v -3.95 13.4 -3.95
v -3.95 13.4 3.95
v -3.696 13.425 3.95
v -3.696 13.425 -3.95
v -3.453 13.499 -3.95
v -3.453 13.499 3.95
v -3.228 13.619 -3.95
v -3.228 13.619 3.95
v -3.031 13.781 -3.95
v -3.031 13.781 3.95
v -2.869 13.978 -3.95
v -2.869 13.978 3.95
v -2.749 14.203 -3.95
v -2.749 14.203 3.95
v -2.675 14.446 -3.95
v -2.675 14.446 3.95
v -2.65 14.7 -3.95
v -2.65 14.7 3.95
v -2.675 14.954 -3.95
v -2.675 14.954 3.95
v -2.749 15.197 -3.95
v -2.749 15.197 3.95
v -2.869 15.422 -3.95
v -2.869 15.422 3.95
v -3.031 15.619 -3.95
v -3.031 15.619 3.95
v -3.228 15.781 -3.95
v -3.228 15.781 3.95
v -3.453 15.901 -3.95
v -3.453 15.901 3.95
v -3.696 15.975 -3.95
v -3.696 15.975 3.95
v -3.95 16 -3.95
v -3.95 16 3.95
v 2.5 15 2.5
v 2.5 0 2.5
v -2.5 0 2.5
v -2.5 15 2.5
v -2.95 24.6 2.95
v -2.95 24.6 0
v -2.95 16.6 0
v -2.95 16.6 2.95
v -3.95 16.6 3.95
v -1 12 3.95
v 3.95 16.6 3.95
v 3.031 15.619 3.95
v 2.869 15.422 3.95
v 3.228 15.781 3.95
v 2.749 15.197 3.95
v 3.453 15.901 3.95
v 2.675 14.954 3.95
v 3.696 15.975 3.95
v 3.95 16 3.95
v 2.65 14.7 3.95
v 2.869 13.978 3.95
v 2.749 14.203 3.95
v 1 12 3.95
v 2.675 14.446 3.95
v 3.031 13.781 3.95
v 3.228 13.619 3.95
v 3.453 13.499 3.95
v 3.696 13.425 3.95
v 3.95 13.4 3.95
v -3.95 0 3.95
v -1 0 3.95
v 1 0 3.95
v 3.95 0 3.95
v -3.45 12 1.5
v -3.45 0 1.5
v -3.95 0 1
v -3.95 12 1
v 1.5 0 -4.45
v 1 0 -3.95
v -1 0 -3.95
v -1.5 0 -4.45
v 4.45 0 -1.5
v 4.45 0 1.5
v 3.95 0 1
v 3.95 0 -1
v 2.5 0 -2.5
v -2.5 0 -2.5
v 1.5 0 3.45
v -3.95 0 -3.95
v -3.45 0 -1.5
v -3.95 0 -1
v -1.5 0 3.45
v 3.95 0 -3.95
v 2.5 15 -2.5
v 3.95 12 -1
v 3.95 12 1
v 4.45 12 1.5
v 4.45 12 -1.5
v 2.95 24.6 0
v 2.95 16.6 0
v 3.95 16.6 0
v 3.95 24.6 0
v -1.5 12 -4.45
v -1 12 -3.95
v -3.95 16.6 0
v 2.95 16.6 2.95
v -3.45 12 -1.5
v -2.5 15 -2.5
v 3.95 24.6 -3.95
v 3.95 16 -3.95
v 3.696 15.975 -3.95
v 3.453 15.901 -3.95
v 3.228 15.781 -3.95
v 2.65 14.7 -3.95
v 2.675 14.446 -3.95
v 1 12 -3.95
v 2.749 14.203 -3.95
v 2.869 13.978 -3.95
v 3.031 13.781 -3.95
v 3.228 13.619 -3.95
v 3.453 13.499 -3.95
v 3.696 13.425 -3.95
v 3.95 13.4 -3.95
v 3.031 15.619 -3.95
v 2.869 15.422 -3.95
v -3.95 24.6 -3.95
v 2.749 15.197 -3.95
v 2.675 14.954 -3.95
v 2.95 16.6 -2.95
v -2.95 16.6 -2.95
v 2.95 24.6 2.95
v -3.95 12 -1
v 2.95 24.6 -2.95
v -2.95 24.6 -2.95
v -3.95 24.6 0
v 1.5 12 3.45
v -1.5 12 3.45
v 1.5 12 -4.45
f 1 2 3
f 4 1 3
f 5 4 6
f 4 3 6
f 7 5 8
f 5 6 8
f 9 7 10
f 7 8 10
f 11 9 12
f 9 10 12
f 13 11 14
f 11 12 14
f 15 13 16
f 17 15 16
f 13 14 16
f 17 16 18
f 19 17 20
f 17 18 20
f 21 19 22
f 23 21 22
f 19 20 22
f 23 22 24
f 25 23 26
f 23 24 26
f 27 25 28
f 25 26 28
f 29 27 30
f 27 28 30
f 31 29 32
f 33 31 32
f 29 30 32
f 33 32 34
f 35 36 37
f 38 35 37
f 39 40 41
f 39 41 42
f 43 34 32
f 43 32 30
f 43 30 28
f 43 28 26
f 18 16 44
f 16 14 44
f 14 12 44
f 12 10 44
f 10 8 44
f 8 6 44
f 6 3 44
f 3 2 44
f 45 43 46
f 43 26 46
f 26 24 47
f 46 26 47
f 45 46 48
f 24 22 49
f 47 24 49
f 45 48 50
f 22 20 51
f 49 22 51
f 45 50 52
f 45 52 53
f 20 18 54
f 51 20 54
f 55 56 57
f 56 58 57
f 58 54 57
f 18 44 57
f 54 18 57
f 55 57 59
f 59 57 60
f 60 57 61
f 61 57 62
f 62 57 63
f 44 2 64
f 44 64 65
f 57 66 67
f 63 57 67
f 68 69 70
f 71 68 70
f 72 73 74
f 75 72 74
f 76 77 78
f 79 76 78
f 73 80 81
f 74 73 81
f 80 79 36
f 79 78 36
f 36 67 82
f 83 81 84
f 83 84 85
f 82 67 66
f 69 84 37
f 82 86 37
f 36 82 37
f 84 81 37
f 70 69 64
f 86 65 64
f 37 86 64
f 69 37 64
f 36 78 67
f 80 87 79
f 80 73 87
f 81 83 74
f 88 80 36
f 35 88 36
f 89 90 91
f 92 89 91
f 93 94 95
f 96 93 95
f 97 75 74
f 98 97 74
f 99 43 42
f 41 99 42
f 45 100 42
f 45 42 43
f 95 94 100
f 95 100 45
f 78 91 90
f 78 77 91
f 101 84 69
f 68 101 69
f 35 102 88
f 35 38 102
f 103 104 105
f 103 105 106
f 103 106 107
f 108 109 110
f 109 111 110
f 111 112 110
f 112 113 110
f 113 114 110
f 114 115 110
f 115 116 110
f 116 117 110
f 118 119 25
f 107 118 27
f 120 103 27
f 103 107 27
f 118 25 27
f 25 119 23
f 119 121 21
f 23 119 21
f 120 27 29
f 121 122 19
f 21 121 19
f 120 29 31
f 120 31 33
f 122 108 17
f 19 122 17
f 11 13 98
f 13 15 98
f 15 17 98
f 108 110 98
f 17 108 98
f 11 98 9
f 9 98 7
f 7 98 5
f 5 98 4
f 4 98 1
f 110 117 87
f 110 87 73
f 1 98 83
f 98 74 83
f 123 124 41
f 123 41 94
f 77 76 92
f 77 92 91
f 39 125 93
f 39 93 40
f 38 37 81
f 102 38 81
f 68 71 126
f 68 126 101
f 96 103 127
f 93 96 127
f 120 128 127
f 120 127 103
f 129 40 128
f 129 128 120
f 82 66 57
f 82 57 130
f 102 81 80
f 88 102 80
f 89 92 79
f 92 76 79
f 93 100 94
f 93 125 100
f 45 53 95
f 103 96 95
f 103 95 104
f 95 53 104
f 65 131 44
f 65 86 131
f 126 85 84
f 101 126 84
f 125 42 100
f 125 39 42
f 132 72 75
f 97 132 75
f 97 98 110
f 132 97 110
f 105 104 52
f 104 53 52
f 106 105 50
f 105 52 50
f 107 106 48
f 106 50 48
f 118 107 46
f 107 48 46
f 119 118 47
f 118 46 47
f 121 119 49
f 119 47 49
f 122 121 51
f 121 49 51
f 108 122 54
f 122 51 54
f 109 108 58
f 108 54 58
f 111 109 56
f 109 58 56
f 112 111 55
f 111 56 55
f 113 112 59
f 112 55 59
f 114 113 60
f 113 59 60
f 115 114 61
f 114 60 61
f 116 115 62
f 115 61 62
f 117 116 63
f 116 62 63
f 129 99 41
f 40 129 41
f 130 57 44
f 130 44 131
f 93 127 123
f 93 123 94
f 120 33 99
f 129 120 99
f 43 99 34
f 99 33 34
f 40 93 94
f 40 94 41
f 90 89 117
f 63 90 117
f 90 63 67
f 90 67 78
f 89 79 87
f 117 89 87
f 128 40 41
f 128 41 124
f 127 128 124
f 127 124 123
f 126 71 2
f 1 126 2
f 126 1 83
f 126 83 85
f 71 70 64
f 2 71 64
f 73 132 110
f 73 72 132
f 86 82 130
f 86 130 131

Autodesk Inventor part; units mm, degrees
ref_plane "YZ Plane" through (0, 0, 0) normal (1, 0, 0) x (0, 1, 0)
ref_plane "XZ Plane" through (0, 0, 0) normal (0, 1, 0) x (-1, 0, 0)
ref_plane "XY Plane" through (0, 0, 0) normal (0, 0, 1) x (1, 0, 0)
sketch "Sketch1" plane through (0, 0, 0) normal (0, 1, 0) x (-1, 0, 0)
  line L0 (-3.95, -3.95) -> (3.95, -3.95)
  line L1 (3.95, -3.95) -> (3.95, 3.95)
  line L2 (3.95, 3.95) -> (-3.95, 3.95)
  line L3 (-3.95, 3.95) -> (-3.95, -3.95)
  line L4 (-3.95, -3.95) -> (3.95, 3.95) construction
  line L5 (3.95, -3.95) -> (-3.95, 3.95) construction
  point P0 (0, 0)
  dimension "d0" = 7.9
  dimension "d1" = 7.9
extrude "Extrusion1" add sketch "Sketch1" along normal blind 24.6
sketch "Sketch2" plane through (-3.95, 0, 3.95) normal (0, 0, 1) x (1, 0, 0)
  line L0 (7.9, 0) -> (7.9, 24.6) projected
  line L1 (0, 24.6) -> (7.9, 24.6) projected
  line L2 (0, 0) -> (0, 24.6) projected
  circle A0 centre (0, 14.7) radius 1.3
  circle A1 centre (7.9, 14.7) radius 1.3
  point P0 (3.95, 0)
  dimension "d4" = 2.6
  dimension "d5" = 2.6
  dimension "d6" = 9.9
  dimension "d7" = 9.9
extrude "Extrusion2" cut sketch "Sketch2" against normal through all
sketch "Sketch3" plane through (0, 0, 0) normal (0, -1, 0) x (1, 0, 0)
  line L0 (-2.5, -2.5) -> (2.5, -2.5)
  line L1 (2.5, -2.5) -> (2.5, 2.5)
  line L2 (2.5, 2.5) -> (-2.5, 2.5)
  line L3 (-2.5, 2.5) -> (-2.5, -2.5)
  line L4 (-2.5, -2.5) -> (2.5, 2.5) construction
  line L5 (2.5, -2.5) -> (-2.5, 2.5) construction
  point P0 (0, 0)
  dimension "d10" = 5
  dimension "d11" = 5
extrude "Extrusion3" cut sketch "Sketch3" against normal blind 15
sketch "Sketch4" plane through (0, 24.6, 0) normal (0, 1, 0) x (1, 0, 0)
  line L0 (-3.95, 3.95) -> (-3.95, -3.95) projected
  line L1 (-3.95, -3.95) -> (3.95, -3.95) projected
  line L2 (3.95, -3.95) -> (3.95, 3.95) projected
  line L3 (-3.95, 0) -> (-2.95, 0)
  line L4 (-2.95, 0) -> (-2.95, -2.95)
  line L5 (-2.95, -2.95) -> (2.95, -2.95)
  line L6 (2.95, -2.95) -> (2.95, 0)
  line L7 (2.95, 0) -> (3.95, 0)
  point P0 (0, 0)
  dimension "d14" = 1
  dimension "d15" = 1
  dimension "d16" = 1
extrude "Extrusion4" cut sketch "Sketch4" against normal blind 8
sketch "Sketch5" plane through (0, 24.6, 0) normal (0, 1, 0) x (1, 0, 0)
  line L0 (3.95, 3.95) -> (-3.95, 3.95) projected
  line L1 (-3.95, 3.95) -> (-3.95, 0) projected
  line L2 (-2.95, 2.95) -> (2.95, 2.95)
  line L3 (2.95, 2.95) -> (2.95, 0)
  line L4 (2.95, 0) -> (-2.95, 0)
  line L5 (-2.95, 0) -> (-2.95, 2.95)
  line L6 (-2.95, 2.95) -> (2.95, 0) construction
  line L7 (2.95, 2.95) -> (-2.95, 0) construction
  point P0 (0, 0)
  point P1 (0, 1.475)
  dimension "d19" = 1
  dimension "d20" = 1
extrude "Extrusion5" cut sketch "Sketch5" against normal blind 8
sketch "Sketch6" plane through (0, 0, 0) normal (0, -1, 0) x (1, 0, 0)
  line L0 (3.95, -3.95) -> (-3.95, -3.95) projected
  line L1 (3.95, 3.95) -> (3.95, -3.95) projected
  line L2 (-3.95, -3.95) -> (-3.95, 3.95) projected
  line L3 (1.5, -4.45) -> (-1.5, -4.45)
  line L4 (1.5, -4.45) -> (1, -3.95)
  line L5 (-1.5, -4.45) -> (-1, -3.95)
  line L6 (3.95, -3.95) -> (2.5, -2.5) construction
  line L7 (4.45, -1.5) -> (4.45, 1.5)
  line L8 (4.45, -1.5) -> (3.95, -1)
  line L9 (4.45, 1.5) -> (3.95, 1)
  line L10 (3.95, 1) -> (3.95, -1)
  point P0 (0, 0)
  dimension "d23" = 3
  dimension "d24" = 1.5
  dimension "d26" = 0.5
  dimension "d27" = 45
  dimension "d28" = 45
extrude "Extrusion6" add sketch "Sketch6" against normal blind 12
sketch "Sketch7" plane through (0, 0, 0) normal (0, -1, 0) x (1, 0, 0)
  line L0 (-2.5, -2.5) -> (-2.5, 2.5) projected
  line L1 (-3.95, -3.95) -> (-3.95, 3.95) projected
  line L2 (-1.5, -4.45) -> (1.5, -4.45) projected
  line L3 (1.5, -4.45) -> (1, -3.95) projected
  line L4 (-3.95, -1) -> (-3.45, -1.5)
  line L5 (-3.45, -1.5) -> (-3.45, 1.5)
  line L6 (-3.45, 1.5) -> (-3.95, 1)
  line L7 (-3.95, 1) -> (-3.95, -1)
  line L8 (-3.95, 3.95) -> (-2.5, 2.5) construction
  line L9 (1, 3.95) -> (1.5, 3.45)
  line L10 (1.5, 3.45) -> (-1.5, 3.45)
  line L11 (-1.5, 3.45) -> (-1, 3.95)
  line L12 (-1, 3.95) -> (1, 3.95)
  point P0 (0, 0)
  dimension "d34" = 3
  dimension "d35" = 1.5
  dimension "d36" = 0.5
extrude "Extrusion7" cut sketch "Sketch7" against normal blind 12
properties part number "PowerPole45" material "ABS Plastic"
